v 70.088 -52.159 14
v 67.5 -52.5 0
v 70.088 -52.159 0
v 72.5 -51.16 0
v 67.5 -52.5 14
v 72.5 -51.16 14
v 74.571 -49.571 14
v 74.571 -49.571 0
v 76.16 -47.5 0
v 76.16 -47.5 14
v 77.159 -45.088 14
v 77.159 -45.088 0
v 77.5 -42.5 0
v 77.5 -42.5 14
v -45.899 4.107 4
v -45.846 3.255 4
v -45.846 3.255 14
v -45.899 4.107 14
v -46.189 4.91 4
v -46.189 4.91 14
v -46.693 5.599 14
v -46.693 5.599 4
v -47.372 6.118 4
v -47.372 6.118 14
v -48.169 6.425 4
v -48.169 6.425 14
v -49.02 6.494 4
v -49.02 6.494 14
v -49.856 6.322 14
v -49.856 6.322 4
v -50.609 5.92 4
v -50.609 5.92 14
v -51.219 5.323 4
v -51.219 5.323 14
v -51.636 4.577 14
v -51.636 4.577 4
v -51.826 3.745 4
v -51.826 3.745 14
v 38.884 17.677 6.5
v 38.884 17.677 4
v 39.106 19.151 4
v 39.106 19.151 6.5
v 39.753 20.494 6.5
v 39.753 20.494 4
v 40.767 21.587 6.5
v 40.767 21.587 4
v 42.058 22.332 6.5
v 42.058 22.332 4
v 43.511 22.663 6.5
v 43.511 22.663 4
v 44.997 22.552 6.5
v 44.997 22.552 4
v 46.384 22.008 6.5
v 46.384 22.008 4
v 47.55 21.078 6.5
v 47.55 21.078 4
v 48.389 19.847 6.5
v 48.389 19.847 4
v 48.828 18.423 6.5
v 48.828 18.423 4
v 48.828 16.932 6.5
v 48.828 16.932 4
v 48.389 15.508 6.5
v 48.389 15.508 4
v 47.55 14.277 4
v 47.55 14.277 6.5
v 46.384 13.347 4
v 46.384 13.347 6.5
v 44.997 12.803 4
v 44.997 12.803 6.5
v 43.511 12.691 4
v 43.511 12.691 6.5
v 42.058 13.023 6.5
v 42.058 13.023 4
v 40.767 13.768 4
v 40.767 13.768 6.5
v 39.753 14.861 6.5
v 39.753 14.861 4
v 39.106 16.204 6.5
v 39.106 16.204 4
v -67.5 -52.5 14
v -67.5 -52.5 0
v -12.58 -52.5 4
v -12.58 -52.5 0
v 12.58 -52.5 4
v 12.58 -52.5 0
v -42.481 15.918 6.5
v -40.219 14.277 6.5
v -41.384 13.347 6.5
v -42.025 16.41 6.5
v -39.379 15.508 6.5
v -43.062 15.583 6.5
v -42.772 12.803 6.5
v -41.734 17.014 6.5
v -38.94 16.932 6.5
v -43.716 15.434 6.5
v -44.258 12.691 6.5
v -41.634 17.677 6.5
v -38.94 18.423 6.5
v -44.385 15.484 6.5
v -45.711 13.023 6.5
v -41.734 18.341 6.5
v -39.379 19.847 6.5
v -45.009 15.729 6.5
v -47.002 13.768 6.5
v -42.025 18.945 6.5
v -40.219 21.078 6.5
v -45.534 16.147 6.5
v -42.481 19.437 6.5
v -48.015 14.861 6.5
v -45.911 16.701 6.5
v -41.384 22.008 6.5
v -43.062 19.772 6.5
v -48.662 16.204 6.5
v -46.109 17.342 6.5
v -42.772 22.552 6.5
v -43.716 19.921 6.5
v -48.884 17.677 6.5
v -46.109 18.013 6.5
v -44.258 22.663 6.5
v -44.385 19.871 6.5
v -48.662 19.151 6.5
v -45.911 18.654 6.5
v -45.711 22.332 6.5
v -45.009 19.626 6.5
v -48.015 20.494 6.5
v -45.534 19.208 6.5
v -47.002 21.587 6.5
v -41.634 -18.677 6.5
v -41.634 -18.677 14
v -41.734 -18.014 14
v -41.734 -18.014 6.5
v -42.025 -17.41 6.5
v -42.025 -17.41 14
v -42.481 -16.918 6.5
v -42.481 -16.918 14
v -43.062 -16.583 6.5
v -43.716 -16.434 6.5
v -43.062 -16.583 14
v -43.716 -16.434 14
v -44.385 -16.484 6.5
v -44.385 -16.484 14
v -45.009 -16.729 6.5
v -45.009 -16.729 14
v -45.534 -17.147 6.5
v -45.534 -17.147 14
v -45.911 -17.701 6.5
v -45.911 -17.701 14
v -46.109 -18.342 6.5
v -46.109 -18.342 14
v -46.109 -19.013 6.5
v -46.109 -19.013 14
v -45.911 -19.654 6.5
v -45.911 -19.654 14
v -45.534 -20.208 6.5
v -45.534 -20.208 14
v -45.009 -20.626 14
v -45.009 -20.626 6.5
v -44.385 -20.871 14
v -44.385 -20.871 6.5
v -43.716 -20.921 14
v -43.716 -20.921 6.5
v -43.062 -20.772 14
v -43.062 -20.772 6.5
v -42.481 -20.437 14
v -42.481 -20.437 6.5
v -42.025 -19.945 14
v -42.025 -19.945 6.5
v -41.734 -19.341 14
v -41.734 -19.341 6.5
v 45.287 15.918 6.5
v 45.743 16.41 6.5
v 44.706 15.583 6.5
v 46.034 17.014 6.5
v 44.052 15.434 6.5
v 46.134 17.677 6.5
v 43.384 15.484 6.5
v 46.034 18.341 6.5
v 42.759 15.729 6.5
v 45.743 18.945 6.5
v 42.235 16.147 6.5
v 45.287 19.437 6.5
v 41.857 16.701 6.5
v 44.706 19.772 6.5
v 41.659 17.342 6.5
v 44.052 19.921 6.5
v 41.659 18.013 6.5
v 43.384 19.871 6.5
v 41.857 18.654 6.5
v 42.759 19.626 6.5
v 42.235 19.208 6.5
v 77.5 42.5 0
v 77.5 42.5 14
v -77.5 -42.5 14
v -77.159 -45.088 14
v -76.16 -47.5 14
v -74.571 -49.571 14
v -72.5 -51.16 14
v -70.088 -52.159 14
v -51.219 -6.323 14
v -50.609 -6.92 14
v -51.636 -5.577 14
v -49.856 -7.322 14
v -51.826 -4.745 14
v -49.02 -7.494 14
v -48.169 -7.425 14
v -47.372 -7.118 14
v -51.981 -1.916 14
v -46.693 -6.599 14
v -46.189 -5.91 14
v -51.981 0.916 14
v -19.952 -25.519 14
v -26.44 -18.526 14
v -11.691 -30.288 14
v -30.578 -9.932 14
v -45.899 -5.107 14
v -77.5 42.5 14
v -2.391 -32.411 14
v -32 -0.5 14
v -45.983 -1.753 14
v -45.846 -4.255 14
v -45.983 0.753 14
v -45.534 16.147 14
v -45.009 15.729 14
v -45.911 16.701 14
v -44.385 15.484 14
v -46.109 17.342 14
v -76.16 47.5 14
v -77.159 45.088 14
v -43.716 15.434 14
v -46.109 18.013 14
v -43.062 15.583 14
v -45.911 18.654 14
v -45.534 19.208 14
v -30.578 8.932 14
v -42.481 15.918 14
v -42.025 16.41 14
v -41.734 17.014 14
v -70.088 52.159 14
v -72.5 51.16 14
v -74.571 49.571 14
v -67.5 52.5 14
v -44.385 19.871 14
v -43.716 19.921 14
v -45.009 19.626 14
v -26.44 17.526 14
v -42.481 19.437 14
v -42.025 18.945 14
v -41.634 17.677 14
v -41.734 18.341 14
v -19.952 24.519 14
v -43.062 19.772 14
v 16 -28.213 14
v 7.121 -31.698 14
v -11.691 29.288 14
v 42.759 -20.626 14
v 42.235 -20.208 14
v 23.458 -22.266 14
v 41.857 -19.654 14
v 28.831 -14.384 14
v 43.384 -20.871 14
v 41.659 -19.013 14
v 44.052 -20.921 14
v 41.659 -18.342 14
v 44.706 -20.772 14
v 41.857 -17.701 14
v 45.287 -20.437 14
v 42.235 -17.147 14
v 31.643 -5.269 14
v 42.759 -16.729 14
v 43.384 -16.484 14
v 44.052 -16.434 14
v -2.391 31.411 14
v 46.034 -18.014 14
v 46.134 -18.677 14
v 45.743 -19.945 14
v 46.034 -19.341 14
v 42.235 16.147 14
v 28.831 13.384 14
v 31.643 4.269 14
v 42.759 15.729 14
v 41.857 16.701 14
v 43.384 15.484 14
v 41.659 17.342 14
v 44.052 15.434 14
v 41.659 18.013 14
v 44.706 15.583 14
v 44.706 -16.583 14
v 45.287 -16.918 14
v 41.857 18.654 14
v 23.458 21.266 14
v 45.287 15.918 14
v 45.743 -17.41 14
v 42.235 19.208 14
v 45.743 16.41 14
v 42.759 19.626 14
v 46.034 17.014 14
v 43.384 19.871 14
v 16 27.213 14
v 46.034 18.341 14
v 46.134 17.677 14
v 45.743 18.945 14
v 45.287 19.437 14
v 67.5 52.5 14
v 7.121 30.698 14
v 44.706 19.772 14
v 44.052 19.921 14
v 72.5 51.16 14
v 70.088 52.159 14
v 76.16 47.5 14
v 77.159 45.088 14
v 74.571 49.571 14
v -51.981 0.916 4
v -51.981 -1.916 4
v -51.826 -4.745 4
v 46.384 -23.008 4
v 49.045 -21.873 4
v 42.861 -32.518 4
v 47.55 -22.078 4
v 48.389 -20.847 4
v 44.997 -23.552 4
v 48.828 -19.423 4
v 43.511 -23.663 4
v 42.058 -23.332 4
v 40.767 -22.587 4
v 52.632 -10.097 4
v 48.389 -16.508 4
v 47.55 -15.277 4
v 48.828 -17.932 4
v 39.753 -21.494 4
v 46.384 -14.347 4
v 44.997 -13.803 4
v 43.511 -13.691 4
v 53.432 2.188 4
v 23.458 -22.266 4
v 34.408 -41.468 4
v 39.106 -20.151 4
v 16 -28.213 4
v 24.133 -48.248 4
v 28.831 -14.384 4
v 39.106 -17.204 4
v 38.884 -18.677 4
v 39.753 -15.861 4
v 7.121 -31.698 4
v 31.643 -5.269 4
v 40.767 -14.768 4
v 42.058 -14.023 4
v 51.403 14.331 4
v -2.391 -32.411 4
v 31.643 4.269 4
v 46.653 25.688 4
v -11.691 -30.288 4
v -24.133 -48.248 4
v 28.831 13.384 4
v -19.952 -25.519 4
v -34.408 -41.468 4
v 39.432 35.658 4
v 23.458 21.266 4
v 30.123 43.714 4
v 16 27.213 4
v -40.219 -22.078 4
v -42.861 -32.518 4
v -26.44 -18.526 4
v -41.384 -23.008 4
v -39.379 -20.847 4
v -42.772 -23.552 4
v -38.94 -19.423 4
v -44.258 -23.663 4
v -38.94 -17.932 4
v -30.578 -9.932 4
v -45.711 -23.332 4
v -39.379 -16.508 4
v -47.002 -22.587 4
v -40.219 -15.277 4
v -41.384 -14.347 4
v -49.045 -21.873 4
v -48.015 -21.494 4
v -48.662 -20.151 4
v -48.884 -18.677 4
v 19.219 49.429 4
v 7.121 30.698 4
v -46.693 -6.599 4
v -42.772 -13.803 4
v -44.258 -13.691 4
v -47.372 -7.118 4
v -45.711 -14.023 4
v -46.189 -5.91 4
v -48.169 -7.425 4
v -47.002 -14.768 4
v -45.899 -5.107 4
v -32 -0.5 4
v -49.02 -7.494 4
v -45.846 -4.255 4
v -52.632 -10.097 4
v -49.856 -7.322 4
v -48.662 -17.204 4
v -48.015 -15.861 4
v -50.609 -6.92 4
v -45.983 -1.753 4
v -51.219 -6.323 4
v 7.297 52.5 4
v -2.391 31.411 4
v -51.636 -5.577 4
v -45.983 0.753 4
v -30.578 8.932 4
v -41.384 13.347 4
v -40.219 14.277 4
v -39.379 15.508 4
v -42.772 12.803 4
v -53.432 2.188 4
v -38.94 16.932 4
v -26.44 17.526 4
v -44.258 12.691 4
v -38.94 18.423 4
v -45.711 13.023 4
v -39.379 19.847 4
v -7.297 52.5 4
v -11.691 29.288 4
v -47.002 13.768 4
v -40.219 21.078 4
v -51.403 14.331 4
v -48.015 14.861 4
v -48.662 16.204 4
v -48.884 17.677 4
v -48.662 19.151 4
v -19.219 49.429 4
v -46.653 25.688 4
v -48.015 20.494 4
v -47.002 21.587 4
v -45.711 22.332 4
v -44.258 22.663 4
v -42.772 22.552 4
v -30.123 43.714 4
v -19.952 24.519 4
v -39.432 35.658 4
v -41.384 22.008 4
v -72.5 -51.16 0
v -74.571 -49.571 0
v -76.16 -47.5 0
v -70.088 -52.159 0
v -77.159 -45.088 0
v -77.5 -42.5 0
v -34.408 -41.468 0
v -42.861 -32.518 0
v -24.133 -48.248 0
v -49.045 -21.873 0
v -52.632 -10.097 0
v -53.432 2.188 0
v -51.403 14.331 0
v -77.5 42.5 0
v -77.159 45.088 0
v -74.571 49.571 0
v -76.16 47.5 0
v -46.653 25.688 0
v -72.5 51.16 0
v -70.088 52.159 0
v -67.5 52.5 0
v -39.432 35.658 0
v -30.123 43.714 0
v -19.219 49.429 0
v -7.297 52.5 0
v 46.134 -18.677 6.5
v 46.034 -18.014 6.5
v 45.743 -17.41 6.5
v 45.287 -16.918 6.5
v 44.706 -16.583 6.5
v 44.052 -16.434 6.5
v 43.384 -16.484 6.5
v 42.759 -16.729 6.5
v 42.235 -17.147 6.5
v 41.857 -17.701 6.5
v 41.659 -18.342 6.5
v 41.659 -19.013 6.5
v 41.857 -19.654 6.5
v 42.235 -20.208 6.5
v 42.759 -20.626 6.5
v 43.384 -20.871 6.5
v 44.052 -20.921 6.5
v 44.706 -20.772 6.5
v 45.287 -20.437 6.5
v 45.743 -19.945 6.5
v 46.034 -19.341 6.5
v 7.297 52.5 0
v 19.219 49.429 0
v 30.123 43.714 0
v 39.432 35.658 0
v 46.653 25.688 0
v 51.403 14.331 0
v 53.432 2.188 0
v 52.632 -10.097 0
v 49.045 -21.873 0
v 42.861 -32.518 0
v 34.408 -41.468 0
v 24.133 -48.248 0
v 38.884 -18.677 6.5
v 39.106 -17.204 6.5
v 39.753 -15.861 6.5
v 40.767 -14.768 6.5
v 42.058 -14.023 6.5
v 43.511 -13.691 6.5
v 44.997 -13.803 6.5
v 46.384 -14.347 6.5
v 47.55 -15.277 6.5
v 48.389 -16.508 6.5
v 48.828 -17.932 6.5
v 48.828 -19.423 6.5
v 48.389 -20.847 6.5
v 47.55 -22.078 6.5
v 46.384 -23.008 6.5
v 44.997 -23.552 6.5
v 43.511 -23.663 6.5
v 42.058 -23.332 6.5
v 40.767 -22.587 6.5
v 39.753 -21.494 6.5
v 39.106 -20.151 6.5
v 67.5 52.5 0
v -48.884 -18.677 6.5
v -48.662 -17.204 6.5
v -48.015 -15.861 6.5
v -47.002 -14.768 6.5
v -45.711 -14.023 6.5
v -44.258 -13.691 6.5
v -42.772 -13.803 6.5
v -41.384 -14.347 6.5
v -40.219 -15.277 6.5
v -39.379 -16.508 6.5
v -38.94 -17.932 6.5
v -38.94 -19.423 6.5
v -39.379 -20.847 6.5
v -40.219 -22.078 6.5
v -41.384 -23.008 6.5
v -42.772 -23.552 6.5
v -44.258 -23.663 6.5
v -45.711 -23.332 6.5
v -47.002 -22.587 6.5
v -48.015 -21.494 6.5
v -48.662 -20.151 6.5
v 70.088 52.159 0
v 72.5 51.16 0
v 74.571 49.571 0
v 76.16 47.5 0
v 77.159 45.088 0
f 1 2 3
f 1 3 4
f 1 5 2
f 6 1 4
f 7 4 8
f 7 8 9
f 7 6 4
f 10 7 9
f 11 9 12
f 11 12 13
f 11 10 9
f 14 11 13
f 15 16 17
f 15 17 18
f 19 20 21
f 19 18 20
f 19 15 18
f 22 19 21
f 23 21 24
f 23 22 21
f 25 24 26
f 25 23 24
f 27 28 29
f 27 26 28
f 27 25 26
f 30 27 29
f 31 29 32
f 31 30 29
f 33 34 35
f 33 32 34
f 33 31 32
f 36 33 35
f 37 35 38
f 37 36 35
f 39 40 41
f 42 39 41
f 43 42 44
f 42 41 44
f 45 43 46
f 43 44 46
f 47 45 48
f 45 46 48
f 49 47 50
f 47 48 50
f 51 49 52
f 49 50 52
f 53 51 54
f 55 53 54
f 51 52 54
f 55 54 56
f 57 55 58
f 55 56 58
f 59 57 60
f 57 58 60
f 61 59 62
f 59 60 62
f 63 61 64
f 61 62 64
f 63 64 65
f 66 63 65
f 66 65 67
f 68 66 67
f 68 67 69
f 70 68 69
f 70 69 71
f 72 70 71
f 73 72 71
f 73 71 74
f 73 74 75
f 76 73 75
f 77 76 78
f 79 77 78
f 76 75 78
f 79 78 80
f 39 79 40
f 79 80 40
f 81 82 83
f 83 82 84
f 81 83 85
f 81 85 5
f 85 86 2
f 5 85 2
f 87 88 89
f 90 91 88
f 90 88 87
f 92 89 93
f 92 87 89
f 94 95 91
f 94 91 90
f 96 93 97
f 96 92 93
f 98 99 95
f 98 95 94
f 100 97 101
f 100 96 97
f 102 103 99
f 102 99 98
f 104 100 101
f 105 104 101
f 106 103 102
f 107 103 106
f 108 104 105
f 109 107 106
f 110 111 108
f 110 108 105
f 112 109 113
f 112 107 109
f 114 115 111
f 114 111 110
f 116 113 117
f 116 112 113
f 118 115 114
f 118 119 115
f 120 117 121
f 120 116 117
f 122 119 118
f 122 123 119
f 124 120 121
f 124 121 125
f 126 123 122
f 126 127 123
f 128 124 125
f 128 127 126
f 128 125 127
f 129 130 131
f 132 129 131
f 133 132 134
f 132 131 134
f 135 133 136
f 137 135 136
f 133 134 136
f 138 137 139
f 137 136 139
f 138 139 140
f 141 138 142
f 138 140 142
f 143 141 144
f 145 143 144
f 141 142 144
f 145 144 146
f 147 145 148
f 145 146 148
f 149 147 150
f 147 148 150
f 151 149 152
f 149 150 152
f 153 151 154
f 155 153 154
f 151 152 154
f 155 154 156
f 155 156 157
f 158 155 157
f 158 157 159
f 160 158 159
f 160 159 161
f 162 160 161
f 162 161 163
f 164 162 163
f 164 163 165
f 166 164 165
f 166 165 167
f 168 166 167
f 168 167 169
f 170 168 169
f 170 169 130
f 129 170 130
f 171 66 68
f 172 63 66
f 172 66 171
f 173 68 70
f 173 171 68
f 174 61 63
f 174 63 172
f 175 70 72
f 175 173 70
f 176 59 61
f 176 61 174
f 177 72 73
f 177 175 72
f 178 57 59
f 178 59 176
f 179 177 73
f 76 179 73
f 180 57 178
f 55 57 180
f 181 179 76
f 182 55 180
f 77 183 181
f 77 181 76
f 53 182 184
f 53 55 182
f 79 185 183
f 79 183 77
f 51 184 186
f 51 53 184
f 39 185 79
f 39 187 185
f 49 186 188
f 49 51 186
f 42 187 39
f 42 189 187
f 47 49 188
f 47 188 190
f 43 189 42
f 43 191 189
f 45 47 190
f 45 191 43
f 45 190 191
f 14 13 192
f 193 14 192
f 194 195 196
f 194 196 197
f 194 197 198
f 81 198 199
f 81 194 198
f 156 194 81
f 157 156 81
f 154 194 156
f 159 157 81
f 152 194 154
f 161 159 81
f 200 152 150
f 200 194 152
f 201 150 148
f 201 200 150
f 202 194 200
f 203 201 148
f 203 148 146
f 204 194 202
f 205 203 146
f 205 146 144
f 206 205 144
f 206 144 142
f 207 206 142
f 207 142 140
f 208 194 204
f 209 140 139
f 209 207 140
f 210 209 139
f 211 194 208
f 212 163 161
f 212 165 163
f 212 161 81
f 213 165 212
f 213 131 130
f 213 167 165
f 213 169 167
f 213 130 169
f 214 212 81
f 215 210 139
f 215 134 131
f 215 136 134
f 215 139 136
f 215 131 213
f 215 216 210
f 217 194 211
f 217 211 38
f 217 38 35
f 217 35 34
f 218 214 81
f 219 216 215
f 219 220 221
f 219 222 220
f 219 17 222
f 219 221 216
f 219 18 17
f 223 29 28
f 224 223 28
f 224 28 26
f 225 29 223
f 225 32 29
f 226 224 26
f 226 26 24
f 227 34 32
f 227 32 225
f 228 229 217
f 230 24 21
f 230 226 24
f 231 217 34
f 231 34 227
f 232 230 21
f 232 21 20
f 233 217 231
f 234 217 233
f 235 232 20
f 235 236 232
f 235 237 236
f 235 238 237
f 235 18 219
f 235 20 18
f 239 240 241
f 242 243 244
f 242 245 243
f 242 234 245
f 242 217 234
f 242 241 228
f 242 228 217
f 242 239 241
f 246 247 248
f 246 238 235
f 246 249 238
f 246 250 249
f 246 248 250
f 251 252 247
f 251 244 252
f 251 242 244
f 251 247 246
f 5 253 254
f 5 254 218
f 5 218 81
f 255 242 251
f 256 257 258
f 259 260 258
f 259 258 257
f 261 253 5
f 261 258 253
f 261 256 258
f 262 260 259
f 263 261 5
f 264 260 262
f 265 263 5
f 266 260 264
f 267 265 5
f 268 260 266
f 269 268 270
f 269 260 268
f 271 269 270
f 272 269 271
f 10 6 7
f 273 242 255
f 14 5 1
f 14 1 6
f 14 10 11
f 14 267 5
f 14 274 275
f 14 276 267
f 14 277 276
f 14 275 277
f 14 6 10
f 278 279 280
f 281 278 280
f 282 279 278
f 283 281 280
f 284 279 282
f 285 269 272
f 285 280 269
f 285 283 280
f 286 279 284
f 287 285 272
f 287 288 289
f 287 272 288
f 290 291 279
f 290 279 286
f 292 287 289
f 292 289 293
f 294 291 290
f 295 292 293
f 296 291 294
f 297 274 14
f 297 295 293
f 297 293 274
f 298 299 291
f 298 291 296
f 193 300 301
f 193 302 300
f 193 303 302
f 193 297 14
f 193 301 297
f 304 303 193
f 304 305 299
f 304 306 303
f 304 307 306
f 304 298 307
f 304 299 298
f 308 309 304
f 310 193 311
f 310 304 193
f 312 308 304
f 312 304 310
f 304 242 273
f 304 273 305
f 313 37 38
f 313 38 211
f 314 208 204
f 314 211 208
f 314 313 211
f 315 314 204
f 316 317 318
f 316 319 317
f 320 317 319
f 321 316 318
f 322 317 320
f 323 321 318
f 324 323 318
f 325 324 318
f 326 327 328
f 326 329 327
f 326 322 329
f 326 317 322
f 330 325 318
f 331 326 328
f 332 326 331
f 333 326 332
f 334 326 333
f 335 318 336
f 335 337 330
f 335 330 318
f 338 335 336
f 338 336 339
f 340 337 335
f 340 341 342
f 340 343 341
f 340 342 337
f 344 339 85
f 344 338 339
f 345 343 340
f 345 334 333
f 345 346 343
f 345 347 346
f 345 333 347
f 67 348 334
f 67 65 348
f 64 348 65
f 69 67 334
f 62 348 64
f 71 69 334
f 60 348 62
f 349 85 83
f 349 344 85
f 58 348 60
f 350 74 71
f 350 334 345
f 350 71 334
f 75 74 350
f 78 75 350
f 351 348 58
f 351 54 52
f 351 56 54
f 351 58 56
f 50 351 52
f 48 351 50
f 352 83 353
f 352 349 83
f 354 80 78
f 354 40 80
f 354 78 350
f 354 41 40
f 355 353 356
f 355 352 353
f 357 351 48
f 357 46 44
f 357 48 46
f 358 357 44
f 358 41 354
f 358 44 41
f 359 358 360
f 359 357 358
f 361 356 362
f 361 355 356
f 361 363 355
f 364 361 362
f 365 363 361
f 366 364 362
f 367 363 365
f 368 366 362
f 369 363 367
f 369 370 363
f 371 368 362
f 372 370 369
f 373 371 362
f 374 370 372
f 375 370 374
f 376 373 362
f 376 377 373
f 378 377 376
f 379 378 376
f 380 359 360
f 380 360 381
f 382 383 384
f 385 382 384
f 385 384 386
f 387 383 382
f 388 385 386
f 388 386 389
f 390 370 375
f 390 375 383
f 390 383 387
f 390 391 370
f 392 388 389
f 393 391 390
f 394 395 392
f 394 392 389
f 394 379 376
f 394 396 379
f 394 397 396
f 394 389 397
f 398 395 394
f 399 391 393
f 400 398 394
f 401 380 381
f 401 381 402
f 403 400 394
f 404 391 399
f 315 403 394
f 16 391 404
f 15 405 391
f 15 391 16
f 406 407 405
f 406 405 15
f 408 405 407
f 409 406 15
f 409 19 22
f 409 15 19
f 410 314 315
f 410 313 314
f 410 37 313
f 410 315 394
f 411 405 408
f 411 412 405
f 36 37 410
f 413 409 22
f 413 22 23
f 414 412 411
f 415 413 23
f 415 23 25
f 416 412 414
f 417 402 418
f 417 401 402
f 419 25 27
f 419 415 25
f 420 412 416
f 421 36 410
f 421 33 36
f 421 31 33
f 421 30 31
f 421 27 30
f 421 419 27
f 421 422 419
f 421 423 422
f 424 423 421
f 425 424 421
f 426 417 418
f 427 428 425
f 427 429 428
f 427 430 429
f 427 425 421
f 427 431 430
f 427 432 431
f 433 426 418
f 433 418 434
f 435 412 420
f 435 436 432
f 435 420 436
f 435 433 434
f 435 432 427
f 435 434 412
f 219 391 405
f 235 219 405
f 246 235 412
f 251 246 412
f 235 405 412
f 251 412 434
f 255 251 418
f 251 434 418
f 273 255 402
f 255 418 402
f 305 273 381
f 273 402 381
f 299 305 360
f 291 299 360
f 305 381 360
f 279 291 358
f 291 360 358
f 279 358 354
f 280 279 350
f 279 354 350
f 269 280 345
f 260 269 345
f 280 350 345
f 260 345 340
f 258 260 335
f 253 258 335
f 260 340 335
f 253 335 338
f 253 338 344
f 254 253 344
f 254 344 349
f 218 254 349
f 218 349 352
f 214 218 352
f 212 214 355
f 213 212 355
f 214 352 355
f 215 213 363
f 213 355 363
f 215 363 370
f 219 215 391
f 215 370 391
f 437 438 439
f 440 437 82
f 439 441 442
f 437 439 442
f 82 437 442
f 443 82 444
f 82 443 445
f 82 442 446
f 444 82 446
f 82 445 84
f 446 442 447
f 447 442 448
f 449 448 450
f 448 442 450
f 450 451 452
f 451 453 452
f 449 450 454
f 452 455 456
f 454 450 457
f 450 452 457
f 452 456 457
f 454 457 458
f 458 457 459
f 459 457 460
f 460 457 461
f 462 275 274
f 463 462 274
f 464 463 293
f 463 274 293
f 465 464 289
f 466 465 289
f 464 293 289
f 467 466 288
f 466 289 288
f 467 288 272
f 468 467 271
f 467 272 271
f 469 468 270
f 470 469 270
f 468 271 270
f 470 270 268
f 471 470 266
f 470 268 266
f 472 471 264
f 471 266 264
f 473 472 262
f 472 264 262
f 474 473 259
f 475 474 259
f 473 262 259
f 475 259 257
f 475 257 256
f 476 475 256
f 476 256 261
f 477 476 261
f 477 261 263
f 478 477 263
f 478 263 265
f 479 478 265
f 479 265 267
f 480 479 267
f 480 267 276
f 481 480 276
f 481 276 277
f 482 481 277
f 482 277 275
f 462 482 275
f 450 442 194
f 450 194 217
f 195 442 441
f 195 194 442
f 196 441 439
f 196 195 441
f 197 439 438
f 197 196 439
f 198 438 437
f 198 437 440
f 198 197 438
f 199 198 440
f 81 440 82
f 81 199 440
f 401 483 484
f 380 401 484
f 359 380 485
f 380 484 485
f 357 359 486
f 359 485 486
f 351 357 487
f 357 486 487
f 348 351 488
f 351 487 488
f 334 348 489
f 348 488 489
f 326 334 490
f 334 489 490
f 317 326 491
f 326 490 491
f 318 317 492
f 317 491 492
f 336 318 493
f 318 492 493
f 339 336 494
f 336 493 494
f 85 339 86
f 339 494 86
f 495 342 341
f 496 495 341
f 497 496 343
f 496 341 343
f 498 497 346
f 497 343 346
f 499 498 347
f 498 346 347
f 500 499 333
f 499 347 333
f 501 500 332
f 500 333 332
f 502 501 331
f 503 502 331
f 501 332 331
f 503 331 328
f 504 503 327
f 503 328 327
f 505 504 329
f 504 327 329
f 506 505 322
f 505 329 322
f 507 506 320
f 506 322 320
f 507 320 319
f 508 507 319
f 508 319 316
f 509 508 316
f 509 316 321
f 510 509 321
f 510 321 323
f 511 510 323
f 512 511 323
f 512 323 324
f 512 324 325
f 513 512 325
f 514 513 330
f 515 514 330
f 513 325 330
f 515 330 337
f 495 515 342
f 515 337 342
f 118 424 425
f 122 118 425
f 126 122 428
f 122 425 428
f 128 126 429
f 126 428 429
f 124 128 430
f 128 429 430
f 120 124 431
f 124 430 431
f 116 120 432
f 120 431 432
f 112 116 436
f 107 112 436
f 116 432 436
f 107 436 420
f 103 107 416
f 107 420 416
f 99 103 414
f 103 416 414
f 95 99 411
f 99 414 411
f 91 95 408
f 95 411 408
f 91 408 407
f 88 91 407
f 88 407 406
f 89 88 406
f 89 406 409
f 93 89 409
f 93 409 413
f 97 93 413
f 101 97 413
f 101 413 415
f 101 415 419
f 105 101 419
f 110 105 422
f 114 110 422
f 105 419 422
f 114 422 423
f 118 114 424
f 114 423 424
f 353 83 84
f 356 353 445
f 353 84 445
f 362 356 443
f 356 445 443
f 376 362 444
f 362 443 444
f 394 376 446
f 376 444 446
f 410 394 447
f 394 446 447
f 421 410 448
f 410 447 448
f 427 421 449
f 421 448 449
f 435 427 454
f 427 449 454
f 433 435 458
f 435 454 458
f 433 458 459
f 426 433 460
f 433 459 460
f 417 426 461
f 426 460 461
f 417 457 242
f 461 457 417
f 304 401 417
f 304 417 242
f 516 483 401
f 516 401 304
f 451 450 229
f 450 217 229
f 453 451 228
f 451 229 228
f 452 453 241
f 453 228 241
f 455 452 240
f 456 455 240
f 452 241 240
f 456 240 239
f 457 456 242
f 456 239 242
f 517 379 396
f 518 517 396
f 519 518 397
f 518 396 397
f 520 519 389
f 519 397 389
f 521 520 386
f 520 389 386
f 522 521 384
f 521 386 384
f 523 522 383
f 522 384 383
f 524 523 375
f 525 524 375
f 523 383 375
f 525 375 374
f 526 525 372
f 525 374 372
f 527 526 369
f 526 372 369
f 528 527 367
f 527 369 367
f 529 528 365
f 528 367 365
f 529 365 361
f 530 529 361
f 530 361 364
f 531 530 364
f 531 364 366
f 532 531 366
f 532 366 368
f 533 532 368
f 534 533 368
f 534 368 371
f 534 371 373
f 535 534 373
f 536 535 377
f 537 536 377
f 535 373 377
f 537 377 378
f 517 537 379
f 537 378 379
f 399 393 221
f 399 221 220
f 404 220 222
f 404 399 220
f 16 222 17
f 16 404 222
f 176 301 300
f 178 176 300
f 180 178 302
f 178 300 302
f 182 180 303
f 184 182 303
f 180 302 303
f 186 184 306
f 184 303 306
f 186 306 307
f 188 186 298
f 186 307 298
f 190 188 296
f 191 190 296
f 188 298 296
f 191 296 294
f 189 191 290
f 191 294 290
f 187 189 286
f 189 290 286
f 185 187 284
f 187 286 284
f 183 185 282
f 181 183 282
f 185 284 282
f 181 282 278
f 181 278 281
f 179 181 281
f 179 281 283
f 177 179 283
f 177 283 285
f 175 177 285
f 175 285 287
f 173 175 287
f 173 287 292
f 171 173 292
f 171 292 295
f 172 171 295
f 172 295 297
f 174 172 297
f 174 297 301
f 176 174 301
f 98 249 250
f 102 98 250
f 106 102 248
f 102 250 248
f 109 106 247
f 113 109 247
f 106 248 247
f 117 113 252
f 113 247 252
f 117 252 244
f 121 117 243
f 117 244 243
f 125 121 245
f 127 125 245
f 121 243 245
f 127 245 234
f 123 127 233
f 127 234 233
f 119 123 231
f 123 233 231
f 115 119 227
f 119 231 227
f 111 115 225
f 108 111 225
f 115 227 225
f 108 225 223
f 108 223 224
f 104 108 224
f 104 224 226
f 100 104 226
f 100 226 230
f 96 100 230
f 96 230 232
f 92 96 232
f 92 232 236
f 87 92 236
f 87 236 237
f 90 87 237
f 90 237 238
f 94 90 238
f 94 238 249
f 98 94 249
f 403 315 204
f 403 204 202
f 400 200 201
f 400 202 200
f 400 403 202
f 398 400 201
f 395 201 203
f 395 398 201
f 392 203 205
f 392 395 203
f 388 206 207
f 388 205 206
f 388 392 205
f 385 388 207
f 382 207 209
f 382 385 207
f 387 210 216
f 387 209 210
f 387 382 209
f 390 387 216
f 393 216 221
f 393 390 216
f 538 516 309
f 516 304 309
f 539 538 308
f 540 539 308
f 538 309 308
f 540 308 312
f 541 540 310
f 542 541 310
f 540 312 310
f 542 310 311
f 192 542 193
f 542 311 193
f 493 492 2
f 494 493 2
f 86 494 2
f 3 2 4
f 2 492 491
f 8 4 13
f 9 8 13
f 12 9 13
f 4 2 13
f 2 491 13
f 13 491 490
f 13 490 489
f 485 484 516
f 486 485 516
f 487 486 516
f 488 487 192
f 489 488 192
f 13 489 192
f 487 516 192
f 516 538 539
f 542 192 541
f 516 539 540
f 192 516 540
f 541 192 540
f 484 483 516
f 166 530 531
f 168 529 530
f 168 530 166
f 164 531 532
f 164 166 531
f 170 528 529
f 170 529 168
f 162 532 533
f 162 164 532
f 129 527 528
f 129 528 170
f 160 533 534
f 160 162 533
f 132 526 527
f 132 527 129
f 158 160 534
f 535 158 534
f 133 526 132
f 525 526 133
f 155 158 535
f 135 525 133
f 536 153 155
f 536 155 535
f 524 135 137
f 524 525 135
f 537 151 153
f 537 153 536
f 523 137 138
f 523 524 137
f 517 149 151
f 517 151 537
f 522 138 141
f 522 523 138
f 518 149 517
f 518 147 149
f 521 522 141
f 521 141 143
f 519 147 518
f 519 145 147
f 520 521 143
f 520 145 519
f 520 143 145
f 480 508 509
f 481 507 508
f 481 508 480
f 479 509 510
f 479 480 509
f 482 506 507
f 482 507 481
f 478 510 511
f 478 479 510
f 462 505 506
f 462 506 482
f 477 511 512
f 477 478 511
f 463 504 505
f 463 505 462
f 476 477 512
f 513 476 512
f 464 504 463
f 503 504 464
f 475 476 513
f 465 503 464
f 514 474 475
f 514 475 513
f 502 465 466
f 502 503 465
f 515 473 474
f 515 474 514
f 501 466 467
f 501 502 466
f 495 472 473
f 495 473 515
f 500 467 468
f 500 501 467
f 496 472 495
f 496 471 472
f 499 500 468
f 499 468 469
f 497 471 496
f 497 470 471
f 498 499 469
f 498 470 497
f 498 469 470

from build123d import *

# Parameters (mm, degrees)
SKETCH2_W           = 155
SKETCH2_H           = 105
BOSS_EXTRUDE1_DEPTH = 14
SKETCH3_R           = 53.5
CUT_EXTRUDE1_DEPTH  = 4
SKETCH4_R           = 32
CUT_EXTRUDE2_DEPTH  = 10
FILLET1_R           = 10
SKETCH5_R           = 2.25
CUT_EXTRUDE3_DEPTH  = 95.649352877
CUT_EXTRUDE4_DEPTH  = 95.649352877
SKETCH8_R           = 5
CUT_EXTRUDE6_DEPTH  = 2.5


with BuildPart() as part:
    # Sketch2 → Boss-Extrude1 (new body)
    with BuildSketch(Plane.XY):
        Rectangle(SKETCH2_W, SKETCH2_H)
    extrude(amount=BOSS_EXTRUDE1_DEPTH)

    # Sketch3 → Cut-Extrude1 (cut)
    with BuildSketch(Plane(origin=(0, 0, 0), x_dir=(-1, 0, 0), z_dir=(0, 0, -1))):
        with Locations((0, -0.5)):
            Circle(SKETCH3_R)
    extrude(amount=-CUT_EXTRUDE1_DEPTH, mode=Mode.SUBTRACT)

    # Sketch4 → Cut-Extrude2 (cut)
    with BuildSketch(Plane(origin=(0, 0, 4), x_dir=(-1, 0, 0), z_dir=(0, 0, -1))):
        with Locations((0, -0.5)):
            Circle(SKETCH4_R)
    extrude(amount=-CUT_EXTRUDE2_DEPTH, mode=Mode.SUBTRACT)

    # Fillet1
    fillet1_edges = [part.edges().sort_by_distance(p)[0] for p in [
        (77.5, -52.5, 7),
        (-77.5, -52.5, 7),
        (-77.5, 52.5, 7),
        (77.5, 52.5, 7),
    ]]
    fillet(fillet1_edges, radius=FILLET1_R)

    # Sketch5 → Cut-Extrude3 (cut, through all)
    with BuildSketch(Plane.XY.offset(14)):
        with Locations((43.884277794, 17.677463037)):
            Circle(SKETCH5_R)
        with Locations((43.884277794, -18.677463037)):
            Circle(SKETCH5_R)
        with Locations((-43.884277794, -18.677463037)):
            Circle(SKETCH5_R)
        with Locations((-43.884277794, 17.677463037)):
            Circle(SKETCH5_R)
    extrude(amount=-CUT_EXTRUDE3_DEPTH, mode=Mode.SUBTRACT)

    # Sketch6 → Cut-Extrude4 (cut, through all)
    with BuildSketch(Plane(origin=(0, 0, 0), x_dir=(-1, 0, 0), z_dir=(0, 0, -1))):
        with BuildLine():
            ThreePointArc((45.846474332, -4.255102041), (46, -0.5), (45.846474332, 3.255102041))
            ThreePointArc((45.846474332, 3.255102041), (48.591563829, 6.489987456), (51.826449245, 3.744897959))
            ThreePointArc((51.826449245, 3.744897959), (52, -0.5), (51.826449245, -4.744897959))
            ThreePointArc((51.826449245, -4.744897959), (48.591563829, -7.489987456), (45.846474332, -4.255102041))
        make_face()
    extrude(amount=-CUT_EXTRUDE4_DEPTH, mode=Mode.SUBTRACT)

    # Sketch8 → Cut-Extrude6 (cut)
    with BuildSketch(Plane(origin=(0, 0, 4), x_dir=(-1, 0, 0), z_dir=(0, 0, -1))):
        with Locations((43.884277794, 17.677463037)):
            Circle(SKETCH8_R)
        with Locations((43.884277794, -18.677463037)):
            Circle(SKETCH8_R)
        with Locations((-43.884277794, 17.677463037)):
            Circle(SKETCH8_R)
        with Locations((-43.884277794, -18.677463037)):
            Circle(SKETCH8_R)
    extrude(amount=-CUT_EXTRUDE6_DEPTH, mode=Mode.SUBTRACT)


solid = part.part
